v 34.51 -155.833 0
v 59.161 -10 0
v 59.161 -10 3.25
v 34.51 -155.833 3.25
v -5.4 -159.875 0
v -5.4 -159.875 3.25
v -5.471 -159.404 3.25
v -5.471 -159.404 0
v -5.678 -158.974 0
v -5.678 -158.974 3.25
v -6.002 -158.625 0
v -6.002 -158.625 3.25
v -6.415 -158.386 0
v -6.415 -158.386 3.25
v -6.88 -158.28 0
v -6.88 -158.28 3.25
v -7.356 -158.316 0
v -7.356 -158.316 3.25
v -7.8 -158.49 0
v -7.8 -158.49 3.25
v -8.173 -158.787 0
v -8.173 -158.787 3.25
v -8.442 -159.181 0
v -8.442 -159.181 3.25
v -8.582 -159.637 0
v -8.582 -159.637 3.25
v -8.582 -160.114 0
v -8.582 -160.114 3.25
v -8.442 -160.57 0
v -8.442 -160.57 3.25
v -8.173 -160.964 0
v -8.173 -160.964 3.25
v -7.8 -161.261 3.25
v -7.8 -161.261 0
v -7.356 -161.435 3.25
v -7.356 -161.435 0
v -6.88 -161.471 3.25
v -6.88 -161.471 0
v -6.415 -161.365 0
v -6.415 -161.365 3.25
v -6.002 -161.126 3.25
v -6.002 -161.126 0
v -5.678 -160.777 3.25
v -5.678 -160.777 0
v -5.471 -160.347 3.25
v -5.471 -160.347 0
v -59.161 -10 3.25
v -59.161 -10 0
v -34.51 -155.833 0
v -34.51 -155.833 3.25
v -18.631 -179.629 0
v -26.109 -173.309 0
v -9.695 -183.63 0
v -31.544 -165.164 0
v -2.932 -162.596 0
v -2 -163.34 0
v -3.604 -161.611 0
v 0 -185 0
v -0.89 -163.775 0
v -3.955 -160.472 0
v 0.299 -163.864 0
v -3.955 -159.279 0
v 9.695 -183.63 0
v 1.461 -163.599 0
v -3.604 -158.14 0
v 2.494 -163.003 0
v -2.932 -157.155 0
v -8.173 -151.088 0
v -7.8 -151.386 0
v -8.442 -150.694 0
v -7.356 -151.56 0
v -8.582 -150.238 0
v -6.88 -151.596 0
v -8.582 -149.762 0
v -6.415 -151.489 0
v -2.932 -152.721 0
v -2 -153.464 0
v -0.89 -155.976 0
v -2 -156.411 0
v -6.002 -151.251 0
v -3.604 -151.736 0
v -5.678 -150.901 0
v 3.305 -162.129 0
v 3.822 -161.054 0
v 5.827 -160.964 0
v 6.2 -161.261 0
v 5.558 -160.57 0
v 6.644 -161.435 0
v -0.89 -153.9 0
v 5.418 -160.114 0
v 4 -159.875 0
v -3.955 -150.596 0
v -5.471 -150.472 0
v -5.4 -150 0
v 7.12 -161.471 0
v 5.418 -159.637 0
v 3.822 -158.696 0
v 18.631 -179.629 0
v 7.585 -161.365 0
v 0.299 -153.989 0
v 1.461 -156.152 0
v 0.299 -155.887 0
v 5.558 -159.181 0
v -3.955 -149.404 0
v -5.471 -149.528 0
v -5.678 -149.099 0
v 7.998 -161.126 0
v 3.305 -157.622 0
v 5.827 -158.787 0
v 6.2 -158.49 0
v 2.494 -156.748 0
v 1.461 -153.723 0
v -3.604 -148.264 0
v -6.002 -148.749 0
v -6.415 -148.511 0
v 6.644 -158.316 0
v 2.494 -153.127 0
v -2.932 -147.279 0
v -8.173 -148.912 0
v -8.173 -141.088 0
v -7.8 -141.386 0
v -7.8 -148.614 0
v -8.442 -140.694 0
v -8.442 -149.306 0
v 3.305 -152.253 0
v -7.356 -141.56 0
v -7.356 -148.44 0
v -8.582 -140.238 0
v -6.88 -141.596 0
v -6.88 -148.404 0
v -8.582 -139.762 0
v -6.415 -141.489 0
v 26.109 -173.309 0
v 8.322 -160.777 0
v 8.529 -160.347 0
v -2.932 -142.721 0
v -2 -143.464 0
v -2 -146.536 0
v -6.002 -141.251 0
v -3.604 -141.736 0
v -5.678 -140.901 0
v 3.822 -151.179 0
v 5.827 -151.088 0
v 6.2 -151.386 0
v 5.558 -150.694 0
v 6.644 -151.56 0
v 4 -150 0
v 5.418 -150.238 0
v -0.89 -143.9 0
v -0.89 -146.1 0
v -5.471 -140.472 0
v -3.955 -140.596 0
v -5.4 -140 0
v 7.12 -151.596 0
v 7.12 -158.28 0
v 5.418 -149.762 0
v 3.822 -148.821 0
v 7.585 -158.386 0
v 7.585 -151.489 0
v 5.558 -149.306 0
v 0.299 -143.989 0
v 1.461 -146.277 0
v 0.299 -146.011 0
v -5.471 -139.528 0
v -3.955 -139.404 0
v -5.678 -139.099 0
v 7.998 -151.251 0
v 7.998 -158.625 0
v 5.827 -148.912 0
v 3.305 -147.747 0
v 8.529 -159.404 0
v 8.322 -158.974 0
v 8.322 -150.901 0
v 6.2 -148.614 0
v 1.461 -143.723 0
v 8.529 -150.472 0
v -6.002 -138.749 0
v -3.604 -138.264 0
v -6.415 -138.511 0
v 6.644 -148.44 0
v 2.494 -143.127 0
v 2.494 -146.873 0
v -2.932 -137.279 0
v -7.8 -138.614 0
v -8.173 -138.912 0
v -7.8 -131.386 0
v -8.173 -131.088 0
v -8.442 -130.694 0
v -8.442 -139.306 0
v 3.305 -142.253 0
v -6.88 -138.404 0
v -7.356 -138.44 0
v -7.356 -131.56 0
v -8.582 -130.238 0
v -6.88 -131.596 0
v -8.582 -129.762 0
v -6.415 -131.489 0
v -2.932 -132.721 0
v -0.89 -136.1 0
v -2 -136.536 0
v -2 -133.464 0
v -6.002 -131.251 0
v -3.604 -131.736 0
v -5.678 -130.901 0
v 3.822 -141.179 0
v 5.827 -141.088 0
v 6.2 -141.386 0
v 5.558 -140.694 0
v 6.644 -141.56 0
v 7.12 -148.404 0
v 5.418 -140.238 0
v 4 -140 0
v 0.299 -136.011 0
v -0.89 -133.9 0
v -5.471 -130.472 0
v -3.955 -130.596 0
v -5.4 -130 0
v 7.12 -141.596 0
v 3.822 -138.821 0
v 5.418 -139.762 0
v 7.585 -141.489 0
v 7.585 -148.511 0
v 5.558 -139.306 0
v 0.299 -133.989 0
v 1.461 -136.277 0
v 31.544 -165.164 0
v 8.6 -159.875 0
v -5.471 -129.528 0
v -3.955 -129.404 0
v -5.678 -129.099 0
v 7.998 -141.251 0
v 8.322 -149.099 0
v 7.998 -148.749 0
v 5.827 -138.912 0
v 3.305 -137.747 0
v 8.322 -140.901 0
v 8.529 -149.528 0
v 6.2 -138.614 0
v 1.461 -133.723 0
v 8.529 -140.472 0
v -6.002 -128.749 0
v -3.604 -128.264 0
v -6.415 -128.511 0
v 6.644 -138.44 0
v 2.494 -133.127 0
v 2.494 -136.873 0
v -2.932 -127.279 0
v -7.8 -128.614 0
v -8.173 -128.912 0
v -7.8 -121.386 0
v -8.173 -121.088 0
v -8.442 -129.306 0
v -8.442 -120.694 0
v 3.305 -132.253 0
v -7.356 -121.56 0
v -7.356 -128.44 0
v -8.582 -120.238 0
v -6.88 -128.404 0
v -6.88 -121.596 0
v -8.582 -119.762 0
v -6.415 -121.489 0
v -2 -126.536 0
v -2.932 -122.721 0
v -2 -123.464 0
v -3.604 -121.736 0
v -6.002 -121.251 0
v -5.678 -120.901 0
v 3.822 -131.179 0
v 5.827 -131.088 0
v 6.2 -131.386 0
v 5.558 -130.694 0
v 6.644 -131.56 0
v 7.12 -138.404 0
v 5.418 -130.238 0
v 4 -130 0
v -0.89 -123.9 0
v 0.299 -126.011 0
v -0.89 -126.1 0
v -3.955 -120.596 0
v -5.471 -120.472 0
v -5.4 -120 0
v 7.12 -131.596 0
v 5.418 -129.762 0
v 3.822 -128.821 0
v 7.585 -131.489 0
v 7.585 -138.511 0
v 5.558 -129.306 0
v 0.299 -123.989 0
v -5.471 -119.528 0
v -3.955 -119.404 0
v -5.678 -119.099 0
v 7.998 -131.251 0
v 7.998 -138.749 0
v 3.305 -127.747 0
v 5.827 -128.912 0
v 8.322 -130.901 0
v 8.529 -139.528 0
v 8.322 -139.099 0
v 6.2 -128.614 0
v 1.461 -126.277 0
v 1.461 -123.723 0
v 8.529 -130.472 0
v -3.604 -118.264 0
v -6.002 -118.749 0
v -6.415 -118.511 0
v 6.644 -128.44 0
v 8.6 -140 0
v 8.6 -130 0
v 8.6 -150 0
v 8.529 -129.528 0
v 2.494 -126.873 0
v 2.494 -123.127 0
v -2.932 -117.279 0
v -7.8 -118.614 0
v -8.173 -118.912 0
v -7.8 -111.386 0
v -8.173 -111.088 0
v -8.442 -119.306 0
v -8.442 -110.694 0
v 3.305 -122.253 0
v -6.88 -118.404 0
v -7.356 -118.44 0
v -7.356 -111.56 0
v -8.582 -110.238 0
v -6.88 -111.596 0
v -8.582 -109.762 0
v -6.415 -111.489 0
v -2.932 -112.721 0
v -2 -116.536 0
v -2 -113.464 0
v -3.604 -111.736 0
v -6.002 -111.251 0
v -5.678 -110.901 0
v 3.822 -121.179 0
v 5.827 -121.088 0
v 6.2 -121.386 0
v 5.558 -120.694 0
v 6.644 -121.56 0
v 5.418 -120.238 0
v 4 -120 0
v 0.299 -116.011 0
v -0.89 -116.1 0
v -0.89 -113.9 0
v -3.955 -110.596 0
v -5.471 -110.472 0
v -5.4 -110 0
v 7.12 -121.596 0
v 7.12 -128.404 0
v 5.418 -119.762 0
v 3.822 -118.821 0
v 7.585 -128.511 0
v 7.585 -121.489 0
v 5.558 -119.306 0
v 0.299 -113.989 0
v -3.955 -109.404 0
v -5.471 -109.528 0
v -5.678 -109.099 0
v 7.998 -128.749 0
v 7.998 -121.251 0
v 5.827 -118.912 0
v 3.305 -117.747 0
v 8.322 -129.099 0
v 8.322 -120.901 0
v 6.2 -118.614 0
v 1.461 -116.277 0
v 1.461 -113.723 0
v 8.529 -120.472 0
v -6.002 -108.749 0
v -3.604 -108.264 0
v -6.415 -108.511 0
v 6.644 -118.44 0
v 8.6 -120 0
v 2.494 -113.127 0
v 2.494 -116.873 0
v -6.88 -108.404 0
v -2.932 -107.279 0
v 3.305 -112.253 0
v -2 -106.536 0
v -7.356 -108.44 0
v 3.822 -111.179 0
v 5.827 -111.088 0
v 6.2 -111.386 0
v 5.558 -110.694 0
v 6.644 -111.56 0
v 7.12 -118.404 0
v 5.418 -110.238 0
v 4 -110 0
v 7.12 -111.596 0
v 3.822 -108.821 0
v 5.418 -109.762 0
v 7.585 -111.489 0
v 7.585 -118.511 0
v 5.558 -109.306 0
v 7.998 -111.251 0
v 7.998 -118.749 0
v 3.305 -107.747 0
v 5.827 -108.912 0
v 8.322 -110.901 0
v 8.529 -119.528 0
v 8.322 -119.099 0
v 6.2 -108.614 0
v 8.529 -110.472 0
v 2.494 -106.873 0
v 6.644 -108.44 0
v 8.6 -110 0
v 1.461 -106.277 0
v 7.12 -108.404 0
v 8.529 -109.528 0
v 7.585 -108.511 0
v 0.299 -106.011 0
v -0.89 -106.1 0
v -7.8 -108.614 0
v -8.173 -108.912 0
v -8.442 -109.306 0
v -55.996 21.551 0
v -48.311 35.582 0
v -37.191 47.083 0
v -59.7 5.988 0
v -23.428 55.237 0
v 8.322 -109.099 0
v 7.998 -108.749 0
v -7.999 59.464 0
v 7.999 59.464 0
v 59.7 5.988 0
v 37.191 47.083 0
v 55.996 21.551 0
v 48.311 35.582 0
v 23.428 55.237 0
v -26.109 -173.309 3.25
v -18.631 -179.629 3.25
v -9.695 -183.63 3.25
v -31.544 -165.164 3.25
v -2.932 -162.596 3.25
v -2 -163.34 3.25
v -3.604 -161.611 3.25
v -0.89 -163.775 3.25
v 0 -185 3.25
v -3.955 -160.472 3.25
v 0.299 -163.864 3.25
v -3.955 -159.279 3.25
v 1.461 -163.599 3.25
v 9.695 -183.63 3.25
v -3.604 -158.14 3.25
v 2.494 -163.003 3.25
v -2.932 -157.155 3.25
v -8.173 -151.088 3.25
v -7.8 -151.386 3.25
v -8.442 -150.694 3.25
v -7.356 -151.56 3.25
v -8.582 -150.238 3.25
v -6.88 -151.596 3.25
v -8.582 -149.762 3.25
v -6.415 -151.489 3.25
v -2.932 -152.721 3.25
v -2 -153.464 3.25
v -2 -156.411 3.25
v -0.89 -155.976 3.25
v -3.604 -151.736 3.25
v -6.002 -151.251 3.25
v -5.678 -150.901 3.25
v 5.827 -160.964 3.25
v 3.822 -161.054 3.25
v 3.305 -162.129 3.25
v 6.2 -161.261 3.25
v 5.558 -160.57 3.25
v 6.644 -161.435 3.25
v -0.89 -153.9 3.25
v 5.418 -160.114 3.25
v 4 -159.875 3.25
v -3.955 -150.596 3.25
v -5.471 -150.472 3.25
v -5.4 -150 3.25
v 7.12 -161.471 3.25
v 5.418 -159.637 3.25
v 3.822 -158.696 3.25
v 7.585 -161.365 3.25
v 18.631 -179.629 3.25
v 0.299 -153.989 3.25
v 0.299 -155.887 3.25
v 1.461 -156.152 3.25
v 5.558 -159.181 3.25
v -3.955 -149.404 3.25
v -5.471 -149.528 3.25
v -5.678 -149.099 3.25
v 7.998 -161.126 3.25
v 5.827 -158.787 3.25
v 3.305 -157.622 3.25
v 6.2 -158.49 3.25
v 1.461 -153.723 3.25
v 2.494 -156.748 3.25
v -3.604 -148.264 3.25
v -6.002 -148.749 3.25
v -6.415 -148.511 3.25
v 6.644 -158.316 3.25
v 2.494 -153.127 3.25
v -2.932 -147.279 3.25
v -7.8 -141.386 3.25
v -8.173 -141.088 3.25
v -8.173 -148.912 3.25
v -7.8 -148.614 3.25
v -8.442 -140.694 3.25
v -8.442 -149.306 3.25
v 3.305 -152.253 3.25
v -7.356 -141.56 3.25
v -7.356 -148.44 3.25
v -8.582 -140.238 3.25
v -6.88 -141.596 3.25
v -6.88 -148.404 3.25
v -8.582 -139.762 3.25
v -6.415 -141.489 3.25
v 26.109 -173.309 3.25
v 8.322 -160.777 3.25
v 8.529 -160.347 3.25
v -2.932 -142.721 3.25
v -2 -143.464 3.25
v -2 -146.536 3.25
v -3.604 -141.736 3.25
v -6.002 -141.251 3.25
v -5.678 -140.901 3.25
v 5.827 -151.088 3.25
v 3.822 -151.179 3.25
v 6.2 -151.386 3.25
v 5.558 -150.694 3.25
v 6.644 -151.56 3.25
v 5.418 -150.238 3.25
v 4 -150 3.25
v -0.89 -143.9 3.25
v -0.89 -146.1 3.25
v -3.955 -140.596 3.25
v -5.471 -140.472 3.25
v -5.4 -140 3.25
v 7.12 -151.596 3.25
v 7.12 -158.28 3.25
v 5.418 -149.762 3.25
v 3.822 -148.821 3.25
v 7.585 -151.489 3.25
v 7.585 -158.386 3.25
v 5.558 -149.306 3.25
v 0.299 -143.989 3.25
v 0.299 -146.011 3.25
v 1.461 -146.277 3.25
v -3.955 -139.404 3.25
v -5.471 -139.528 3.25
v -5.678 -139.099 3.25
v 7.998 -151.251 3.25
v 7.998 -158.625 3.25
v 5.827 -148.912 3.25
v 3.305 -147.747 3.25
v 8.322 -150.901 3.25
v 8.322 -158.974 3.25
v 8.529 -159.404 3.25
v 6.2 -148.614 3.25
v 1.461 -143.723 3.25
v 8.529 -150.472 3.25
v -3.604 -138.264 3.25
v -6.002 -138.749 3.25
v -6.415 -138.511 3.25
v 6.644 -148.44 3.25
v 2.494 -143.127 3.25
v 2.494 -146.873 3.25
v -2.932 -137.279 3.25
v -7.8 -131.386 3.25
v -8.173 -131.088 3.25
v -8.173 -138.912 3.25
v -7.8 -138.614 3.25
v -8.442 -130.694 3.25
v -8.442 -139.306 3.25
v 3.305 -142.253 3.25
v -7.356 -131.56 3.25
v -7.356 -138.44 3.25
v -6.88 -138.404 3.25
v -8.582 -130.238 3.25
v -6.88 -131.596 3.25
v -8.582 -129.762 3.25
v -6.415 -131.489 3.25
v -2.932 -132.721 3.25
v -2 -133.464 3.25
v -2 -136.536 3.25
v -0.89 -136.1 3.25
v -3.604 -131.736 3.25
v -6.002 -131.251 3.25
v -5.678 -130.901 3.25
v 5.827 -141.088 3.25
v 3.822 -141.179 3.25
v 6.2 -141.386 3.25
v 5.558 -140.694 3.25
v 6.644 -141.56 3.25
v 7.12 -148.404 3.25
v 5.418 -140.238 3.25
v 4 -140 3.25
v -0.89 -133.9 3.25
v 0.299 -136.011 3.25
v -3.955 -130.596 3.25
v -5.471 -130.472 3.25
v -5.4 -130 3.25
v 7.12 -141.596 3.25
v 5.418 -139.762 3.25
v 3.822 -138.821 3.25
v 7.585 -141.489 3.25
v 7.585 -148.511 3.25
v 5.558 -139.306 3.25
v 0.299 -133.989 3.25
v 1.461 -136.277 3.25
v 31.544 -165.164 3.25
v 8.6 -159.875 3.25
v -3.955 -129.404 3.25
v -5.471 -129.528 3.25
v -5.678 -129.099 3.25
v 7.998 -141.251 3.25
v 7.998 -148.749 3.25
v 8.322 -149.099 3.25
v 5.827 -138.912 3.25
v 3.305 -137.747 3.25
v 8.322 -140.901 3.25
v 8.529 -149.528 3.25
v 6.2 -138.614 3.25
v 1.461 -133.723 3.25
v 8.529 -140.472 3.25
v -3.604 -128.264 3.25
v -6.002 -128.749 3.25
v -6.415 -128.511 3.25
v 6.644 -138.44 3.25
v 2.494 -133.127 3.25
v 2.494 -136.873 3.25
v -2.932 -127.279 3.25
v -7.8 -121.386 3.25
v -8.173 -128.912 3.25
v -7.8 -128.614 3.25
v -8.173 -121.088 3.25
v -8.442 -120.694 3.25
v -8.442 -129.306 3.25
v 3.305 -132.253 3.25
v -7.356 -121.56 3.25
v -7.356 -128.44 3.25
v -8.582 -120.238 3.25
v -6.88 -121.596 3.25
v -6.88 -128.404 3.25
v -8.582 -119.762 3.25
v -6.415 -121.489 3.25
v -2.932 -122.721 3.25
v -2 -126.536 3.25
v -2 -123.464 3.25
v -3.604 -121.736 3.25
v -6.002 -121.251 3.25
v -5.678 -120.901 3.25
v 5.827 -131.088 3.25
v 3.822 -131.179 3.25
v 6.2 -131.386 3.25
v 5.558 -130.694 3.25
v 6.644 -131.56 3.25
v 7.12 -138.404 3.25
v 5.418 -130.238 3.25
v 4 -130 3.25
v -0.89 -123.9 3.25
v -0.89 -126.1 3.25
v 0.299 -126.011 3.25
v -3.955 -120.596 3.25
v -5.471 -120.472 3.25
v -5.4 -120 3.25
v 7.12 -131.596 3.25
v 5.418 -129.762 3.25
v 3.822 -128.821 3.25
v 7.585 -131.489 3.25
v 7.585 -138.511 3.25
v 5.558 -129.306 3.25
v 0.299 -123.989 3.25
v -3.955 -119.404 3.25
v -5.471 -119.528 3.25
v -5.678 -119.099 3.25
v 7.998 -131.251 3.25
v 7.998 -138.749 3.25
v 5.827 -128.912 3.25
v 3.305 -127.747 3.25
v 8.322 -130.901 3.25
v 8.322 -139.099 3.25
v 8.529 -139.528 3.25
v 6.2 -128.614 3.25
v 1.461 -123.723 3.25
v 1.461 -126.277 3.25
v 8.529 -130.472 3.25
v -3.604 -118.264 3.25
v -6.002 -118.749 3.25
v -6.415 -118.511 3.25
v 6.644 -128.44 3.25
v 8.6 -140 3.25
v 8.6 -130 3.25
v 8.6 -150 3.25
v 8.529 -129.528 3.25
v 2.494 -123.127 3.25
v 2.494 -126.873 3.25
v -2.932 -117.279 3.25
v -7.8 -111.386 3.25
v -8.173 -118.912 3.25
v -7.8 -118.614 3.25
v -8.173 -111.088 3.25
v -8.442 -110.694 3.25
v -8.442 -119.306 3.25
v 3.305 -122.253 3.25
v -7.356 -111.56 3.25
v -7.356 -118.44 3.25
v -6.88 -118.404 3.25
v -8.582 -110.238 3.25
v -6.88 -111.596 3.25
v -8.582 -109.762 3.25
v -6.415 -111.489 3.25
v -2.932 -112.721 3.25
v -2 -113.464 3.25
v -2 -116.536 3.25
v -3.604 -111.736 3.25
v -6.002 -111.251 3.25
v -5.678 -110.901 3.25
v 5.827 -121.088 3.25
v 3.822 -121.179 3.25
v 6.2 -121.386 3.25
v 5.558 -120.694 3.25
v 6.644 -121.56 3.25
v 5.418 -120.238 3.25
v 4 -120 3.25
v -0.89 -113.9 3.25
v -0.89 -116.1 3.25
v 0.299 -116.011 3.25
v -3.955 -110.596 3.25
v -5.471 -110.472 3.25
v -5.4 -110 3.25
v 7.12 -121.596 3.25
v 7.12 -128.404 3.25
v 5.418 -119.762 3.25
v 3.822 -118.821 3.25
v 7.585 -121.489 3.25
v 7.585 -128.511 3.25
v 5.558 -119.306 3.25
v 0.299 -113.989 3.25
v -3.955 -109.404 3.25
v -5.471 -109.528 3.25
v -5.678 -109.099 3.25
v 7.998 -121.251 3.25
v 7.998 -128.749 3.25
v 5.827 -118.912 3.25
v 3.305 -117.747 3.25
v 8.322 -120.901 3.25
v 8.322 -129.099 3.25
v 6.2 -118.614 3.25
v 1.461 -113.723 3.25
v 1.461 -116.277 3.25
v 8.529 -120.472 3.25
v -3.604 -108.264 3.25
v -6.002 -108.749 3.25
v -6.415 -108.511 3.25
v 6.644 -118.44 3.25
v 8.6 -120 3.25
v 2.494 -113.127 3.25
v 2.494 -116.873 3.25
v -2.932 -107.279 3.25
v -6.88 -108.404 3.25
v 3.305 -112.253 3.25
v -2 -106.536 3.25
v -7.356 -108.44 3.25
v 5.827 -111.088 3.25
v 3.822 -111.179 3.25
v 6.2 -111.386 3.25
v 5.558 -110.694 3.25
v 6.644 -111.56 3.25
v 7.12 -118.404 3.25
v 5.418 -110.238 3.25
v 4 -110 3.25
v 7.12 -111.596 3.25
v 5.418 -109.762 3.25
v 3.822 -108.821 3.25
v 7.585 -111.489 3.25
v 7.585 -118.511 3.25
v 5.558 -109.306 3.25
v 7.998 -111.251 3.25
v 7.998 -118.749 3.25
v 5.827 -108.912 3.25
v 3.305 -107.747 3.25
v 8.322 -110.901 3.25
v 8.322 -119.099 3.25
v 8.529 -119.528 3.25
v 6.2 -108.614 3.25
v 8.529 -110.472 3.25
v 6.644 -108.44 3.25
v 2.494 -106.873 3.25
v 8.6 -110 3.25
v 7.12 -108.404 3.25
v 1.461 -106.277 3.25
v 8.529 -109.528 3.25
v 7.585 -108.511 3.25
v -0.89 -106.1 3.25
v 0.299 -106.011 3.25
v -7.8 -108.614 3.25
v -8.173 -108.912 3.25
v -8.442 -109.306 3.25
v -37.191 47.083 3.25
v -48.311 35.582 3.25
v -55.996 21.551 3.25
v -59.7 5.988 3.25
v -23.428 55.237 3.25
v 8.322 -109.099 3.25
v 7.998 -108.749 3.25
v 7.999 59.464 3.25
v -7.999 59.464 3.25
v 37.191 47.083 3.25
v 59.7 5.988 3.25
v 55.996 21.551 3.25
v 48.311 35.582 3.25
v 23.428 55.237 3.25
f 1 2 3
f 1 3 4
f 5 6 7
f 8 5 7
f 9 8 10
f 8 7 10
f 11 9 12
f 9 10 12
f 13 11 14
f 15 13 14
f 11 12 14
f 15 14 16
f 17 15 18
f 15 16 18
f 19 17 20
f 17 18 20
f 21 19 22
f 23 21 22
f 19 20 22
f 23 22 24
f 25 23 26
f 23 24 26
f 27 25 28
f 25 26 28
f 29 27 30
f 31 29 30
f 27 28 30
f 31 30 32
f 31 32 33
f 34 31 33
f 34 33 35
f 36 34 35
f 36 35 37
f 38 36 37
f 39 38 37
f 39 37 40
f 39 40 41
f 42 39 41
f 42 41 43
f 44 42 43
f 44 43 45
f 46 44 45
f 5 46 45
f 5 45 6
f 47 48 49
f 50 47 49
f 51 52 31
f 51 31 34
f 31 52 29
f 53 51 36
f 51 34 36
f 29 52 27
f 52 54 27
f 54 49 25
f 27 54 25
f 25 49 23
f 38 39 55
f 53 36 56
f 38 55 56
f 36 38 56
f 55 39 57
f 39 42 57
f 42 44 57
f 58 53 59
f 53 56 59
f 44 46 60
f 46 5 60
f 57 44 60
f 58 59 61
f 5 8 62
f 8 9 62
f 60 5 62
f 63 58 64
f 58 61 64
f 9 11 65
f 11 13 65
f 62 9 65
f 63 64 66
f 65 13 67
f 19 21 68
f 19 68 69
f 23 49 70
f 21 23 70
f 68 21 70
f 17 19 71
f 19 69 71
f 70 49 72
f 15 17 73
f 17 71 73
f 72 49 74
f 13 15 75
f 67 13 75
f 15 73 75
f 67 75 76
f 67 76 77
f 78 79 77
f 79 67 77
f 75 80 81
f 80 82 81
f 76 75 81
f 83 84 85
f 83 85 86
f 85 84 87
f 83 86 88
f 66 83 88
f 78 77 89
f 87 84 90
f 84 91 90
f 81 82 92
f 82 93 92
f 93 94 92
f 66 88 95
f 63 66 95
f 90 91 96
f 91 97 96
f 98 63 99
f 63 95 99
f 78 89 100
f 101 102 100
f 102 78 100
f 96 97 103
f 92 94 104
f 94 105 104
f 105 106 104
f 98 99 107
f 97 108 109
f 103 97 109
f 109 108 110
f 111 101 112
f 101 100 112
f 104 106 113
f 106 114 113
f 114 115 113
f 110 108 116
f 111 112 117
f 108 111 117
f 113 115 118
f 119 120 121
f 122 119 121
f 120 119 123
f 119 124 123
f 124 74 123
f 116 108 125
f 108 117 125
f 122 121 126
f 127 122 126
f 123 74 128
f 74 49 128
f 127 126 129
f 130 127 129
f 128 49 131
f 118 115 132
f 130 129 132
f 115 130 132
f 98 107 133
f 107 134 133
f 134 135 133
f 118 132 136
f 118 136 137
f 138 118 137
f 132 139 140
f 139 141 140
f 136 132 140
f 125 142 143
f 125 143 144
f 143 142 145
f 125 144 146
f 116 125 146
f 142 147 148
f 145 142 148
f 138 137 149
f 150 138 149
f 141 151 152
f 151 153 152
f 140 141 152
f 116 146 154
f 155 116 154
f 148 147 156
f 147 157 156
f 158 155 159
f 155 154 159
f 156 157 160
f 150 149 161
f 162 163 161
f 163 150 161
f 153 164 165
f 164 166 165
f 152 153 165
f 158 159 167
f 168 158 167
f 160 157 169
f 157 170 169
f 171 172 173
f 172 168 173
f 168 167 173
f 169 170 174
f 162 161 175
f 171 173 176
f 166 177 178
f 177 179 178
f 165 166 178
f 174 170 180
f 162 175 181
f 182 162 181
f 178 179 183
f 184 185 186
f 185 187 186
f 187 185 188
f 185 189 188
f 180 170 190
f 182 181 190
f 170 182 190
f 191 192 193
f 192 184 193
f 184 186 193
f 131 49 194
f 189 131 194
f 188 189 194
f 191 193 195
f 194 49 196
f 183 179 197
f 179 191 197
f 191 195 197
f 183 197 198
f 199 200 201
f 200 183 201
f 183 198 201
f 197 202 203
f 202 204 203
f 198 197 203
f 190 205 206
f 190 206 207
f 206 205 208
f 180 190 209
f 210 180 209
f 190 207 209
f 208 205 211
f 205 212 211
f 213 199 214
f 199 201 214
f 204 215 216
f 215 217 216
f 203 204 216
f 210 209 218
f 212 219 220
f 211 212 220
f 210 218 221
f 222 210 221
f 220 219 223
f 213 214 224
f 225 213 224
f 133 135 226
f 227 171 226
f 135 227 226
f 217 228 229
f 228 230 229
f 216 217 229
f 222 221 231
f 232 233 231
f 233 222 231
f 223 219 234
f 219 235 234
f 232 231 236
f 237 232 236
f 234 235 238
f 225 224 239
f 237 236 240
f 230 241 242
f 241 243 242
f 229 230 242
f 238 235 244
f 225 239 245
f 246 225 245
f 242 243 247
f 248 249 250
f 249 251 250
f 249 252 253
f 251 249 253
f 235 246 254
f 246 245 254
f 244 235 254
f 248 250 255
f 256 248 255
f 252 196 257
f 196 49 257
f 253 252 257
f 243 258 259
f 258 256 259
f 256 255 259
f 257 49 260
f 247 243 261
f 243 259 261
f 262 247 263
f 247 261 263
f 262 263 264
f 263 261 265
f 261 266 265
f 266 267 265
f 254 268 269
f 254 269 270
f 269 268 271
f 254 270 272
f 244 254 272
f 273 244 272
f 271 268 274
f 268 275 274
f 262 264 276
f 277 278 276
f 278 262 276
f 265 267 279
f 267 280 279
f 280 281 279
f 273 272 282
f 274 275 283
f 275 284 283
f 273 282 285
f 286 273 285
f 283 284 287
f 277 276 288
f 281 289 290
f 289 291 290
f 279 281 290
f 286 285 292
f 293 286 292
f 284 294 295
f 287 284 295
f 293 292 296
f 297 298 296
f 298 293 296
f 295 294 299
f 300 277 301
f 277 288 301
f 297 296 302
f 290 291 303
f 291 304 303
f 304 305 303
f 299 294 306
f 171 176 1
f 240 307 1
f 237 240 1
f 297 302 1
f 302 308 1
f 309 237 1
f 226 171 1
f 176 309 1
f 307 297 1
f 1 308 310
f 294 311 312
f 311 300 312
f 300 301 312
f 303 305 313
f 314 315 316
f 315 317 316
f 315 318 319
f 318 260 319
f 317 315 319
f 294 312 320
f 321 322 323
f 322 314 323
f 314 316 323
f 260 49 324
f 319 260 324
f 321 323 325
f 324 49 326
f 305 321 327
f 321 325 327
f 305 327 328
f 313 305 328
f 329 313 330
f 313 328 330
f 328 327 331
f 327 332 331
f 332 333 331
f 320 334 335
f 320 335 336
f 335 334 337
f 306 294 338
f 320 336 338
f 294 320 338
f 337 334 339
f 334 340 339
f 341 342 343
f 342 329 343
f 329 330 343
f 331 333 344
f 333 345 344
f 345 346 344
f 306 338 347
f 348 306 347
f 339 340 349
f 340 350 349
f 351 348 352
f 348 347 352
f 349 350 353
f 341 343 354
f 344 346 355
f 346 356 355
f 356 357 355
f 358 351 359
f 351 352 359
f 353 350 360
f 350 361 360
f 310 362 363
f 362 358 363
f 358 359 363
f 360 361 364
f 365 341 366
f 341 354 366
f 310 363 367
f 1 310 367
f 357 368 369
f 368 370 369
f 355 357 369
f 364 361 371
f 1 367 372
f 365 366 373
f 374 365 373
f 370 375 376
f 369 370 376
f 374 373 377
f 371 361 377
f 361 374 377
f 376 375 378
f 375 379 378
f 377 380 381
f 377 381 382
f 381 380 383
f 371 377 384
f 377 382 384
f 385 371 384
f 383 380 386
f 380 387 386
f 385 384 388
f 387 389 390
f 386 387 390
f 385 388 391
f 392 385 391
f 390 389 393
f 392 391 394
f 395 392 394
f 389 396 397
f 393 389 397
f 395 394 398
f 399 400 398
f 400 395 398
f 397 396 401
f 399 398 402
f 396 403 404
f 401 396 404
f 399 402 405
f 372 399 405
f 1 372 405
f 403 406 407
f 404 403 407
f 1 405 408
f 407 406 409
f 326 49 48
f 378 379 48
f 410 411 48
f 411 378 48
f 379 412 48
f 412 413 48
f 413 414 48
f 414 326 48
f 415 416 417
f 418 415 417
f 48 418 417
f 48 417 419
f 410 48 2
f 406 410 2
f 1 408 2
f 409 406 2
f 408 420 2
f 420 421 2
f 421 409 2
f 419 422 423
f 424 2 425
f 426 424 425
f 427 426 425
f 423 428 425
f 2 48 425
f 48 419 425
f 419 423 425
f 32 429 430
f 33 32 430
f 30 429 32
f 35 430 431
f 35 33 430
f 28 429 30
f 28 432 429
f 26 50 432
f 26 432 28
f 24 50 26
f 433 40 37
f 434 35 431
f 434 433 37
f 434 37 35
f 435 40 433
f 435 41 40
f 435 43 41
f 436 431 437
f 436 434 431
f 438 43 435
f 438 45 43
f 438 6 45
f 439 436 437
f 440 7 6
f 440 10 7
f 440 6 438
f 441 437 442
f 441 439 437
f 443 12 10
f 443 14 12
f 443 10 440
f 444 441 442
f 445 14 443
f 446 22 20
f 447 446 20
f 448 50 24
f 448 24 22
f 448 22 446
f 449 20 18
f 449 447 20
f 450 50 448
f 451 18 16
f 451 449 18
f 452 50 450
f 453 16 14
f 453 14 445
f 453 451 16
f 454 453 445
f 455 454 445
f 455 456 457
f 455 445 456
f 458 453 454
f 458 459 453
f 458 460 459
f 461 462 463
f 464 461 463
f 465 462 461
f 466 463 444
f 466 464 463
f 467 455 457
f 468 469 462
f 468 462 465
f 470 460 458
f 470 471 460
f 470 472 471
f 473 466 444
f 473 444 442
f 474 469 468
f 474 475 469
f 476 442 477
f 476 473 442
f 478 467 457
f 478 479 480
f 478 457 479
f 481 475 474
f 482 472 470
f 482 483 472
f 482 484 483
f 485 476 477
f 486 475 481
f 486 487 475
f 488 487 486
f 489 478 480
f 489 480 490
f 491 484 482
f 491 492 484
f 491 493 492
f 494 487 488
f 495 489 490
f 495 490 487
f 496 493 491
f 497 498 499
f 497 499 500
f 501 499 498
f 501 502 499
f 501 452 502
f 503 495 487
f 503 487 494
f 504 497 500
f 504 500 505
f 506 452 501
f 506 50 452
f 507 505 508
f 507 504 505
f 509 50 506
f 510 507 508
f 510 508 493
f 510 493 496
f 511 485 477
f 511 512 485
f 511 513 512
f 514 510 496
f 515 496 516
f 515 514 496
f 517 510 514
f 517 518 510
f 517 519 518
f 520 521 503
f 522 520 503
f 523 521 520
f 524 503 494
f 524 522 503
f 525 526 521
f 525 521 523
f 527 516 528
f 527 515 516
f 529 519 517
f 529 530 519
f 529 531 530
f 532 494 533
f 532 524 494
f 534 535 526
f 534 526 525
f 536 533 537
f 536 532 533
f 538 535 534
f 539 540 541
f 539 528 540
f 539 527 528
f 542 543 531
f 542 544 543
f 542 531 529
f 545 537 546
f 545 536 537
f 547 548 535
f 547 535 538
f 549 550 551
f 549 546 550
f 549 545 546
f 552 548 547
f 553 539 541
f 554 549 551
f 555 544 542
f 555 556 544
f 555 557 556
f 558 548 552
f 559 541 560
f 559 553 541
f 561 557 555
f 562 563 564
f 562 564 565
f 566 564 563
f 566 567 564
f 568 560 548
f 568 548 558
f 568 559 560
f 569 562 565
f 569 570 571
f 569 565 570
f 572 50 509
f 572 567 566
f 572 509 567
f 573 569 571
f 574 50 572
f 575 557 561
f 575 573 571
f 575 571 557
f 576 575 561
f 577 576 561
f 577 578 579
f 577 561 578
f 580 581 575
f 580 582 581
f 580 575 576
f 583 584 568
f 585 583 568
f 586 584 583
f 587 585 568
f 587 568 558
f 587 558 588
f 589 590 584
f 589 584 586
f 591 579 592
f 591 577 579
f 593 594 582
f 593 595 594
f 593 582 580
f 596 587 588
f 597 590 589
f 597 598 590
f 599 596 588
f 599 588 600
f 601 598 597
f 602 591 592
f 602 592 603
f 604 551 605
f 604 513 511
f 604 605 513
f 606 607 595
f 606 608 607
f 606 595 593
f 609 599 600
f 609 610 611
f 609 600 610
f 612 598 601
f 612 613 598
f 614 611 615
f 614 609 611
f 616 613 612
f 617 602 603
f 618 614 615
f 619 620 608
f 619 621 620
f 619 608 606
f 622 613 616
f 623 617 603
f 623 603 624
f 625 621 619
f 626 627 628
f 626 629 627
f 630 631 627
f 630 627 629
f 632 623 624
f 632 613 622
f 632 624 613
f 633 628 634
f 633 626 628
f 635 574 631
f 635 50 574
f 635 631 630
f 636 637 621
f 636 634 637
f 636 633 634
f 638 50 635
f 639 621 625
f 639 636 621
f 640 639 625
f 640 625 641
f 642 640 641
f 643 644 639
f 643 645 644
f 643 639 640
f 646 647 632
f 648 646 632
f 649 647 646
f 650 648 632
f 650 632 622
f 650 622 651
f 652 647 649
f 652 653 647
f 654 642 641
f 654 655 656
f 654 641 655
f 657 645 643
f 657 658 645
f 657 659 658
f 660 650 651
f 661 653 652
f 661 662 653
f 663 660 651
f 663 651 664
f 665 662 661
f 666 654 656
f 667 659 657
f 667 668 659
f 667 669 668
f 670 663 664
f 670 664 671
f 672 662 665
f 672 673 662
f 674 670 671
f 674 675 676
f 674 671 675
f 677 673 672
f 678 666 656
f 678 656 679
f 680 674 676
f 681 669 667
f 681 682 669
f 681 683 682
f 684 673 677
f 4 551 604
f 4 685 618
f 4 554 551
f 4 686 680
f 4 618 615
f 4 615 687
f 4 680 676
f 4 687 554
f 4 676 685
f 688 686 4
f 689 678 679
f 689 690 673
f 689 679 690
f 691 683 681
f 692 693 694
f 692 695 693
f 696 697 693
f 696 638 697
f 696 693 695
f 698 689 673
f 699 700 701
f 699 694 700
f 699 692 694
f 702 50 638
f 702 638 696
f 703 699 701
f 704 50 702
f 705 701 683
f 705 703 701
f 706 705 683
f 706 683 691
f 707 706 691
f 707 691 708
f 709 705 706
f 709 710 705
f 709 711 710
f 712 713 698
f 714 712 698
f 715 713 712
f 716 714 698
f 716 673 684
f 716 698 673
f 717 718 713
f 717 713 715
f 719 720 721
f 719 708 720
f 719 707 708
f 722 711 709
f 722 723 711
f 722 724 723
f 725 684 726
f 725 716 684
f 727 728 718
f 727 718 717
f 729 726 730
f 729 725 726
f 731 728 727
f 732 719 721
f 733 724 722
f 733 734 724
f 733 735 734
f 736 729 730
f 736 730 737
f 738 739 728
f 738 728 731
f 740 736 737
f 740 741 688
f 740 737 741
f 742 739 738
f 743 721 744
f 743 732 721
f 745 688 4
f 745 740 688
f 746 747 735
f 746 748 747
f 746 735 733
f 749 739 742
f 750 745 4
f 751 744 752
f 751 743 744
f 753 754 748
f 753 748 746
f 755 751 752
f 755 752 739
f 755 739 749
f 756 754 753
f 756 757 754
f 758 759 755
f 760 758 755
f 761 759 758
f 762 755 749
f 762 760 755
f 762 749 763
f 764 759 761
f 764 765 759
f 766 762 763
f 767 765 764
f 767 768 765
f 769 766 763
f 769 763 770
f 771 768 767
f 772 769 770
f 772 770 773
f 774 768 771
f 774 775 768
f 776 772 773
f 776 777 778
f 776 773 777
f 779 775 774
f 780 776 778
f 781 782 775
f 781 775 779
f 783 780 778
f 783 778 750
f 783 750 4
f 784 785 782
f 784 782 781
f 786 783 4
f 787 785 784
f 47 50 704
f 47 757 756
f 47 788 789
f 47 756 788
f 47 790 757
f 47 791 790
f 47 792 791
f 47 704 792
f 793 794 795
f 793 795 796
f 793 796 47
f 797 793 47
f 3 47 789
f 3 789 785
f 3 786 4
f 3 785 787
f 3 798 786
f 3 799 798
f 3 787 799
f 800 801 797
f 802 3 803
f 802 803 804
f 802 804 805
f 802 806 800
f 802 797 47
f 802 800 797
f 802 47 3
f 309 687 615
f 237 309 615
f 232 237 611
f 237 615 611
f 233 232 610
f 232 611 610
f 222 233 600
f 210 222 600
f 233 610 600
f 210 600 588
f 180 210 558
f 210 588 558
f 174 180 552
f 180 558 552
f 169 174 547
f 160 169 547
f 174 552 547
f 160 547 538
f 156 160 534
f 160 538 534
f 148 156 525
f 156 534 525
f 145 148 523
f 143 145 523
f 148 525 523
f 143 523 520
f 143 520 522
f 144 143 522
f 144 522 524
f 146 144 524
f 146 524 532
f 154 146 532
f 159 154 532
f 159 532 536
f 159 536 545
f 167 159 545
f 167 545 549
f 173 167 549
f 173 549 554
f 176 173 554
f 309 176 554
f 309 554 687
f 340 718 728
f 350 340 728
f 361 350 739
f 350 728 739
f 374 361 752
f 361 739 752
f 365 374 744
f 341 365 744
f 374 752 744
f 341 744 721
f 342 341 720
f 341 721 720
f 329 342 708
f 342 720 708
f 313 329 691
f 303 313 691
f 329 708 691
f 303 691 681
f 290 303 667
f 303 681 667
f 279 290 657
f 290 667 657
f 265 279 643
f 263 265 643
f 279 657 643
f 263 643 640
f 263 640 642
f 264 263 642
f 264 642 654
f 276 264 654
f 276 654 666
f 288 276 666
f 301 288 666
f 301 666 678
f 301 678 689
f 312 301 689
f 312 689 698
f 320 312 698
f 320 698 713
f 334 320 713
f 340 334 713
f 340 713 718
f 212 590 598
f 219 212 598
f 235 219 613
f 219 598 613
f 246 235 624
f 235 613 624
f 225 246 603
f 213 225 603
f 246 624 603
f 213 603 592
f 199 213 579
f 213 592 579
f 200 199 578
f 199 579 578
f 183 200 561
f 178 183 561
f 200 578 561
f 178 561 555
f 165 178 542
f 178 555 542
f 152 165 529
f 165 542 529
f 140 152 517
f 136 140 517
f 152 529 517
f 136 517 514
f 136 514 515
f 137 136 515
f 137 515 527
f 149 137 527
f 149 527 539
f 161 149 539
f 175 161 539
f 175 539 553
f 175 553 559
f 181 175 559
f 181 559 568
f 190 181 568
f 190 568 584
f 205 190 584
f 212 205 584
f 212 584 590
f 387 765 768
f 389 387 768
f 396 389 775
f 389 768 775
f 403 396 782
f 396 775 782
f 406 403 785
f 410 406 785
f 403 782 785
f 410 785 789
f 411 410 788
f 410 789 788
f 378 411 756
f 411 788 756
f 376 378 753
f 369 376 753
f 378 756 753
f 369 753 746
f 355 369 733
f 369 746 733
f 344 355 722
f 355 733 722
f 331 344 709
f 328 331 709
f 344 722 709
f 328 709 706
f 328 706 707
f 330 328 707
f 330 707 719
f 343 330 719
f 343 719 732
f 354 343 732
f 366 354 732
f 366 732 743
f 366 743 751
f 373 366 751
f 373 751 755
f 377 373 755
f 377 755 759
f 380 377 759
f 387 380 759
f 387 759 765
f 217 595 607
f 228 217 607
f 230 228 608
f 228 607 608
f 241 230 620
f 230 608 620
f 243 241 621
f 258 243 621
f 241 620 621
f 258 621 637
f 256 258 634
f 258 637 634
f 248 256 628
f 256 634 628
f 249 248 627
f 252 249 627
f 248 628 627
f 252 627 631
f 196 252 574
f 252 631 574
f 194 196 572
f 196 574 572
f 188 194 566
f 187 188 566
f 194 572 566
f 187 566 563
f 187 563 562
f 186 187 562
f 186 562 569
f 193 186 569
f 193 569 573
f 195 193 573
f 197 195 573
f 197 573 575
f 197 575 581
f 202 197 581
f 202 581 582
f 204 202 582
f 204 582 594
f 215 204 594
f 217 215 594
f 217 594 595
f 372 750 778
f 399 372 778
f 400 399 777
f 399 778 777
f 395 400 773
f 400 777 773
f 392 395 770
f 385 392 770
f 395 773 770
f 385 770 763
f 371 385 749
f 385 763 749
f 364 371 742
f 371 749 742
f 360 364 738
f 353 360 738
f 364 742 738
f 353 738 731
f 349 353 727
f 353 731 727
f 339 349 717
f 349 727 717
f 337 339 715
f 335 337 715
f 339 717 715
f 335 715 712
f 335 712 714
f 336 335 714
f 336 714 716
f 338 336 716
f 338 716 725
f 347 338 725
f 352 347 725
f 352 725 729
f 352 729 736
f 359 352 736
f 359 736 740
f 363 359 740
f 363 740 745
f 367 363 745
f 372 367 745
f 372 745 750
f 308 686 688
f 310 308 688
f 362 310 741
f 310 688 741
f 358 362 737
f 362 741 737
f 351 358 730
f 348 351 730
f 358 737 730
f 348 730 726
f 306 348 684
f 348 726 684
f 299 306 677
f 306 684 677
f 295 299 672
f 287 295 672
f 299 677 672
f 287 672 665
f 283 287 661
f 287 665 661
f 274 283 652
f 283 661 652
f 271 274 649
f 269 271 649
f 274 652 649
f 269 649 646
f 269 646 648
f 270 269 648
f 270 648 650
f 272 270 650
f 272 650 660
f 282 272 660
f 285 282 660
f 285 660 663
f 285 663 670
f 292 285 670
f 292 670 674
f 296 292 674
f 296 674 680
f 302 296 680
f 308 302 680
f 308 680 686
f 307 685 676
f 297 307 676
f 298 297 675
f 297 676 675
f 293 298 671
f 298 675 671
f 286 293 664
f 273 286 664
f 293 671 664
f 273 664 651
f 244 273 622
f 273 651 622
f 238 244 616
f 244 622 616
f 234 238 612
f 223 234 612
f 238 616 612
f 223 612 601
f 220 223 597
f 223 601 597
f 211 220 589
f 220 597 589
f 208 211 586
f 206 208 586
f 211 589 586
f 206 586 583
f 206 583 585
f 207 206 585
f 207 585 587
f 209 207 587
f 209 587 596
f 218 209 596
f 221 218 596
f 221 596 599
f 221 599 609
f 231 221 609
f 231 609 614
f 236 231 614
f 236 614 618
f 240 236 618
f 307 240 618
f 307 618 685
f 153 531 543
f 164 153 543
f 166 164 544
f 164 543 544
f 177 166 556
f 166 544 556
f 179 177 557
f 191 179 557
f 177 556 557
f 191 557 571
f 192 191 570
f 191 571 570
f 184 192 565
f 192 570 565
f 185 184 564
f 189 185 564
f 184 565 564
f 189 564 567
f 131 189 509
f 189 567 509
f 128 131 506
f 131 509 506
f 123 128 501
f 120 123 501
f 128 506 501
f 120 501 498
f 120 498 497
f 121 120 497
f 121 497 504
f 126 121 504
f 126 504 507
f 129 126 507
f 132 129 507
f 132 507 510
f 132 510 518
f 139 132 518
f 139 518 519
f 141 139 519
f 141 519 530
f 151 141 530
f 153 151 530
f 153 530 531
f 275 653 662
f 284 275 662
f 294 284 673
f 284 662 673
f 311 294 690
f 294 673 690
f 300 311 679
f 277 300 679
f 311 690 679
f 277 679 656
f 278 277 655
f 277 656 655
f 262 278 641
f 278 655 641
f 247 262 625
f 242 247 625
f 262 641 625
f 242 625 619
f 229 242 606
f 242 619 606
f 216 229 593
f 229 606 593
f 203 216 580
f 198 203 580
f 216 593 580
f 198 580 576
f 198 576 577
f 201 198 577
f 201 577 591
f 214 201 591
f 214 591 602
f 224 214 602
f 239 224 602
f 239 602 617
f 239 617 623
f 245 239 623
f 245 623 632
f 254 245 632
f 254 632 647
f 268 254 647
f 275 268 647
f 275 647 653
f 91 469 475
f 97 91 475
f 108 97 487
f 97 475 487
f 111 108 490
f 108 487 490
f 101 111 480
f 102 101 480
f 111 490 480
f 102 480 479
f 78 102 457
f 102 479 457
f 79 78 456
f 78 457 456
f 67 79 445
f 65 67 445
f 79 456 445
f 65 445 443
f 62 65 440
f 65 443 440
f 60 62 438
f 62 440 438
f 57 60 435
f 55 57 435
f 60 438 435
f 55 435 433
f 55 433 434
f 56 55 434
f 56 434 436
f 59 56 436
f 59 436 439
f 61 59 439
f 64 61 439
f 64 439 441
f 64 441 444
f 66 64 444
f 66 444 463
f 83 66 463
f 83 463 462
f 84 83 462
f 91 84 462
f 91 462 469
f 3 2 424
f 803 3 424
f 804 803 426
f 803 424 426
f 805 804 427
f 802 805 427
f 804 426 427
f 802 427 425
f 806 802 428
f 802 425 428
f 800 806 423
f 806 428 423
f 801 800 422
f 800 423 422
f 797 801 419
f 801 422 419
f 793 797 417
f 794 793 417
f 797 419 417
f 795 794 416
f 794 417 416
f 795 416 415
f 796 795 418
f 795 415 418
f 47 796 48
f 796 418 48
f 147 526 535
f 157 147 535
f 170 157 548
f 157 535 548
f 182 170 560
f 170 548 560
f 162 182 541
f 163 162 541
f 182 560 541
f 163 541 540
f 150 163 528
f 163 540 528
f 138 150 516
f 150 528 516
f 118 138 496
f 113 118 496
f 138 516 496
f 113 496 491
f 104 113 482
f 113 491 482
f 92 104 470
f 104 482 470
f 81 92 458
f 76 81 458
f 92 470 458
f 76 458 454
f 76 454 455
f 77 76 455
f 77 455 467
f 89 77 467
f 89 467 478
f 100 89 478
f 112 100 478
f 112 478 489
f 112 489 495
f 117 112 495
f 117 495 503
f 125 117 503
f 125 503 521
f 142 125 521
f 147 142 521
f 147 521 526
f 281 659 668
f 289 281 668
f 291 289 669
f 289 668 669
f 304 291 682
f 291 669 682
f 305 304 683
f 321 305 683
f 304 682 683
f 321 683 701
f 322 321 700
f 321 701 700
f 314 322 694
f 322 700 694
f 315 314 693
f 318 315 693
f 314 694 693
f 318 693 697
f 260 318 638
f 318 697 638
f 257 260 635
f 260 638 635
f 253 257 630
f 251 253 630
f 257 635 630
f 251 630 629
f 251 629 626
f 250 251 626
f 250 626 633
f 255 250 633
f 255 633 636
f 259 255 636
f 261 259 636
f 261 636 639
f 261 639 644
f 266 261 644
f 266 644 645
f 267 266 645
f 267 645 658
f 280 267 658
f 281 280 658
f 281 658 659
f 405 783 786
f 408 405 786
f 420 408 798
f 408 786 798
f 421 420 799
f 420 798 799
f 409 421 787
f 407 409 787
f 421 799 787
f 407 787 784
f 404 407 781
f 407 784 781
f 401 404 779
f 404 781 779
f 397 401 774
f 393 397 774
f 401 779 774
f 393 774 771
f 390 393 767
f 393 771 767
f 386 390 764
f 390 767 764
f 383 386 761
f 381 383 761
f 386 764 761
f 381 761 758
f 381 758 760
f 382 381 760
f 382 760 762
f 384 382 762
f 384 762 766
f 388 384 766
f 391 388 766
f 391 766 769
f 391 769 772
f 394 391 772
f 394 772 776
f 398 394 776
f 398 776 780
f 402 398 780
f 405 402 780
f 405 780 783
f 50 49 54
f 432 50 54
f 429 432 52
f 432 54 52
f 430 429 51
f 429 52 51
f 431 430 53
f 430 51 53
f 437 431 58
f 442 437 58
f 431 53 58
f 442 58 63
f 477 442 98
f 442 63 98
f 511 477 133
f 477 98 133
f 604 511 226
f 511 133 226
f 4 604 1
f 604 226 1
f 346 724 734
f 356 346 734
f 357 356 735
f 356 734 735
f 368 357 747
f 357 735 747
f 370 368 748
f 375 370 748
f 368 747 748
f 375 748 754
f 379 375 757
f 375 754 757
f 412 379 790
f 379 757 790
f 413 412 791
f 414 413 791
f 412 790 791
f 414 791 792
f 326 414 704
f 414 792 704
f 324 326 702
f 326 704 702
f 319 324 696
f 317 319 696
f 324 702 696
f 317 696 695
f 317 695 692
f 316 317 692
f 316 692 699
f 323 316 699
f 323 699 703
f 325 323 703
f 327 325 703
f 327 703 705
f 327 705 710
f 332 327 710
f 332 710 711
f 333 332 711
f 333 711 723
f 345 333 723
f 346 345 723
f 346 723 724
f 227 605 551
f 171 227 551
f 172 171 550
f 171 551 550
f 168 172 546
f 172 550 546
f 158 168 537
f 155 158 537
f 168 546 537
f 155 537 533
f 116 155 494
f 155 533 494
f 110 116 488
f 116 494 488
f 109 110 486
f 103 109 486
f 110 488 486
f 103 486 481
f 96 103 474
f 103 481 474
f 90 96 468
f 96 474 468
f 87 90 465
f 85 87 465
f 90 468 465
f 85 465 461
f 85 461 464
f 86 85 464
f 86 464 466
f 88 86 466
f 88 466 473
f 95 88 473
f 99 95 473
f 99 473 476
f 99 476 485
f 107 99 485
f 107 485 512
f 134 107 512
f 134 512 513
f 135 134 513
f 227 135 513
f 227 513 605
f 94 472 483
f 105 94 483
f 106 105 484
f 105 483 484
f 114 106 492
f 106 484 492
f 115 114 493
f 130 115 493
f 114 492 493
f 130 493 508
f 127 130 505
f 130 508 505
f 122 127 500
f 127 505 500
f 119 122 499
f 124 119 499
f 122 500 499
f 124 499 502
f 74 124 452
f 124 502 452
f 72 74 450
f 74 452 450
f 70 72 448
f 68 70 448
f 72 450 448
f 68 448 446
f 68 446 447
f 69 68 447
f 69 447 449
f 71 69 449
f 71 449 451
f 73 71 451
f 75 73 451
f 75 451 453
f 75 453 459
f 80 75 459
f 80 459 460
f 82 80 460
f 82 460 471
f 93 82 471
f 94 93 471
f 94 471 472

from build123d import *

# Parameters (mm, degrees)
PAD_DEPTH     = 3.25
SKETCH001_R   = 4
SKETCH001_R_2 = 1.6
POCKET_DEPTH  = 3.5


with BuildPart() as part:
    # Sketch → Pad (new body)
    with BuildSketch(Plane.XY):
        with BuildLine():
            ThreePointArc((59.160798, -10), (0, 60), (-59.160798, -10))
            Line((-59.160798, -10), (-34.510465, -155.833333))
            ThreePointArc((-34.510465, -155.833333), (0, -185), (34.510465, -155.833333))
            Line((59.160798, -10), (34.510465, -155.833333))
        make_face()
    extrude(amount=PAD_DEPTH)

    # Sketch001 (on Face6 of Pad) → Pocket (cut)
    with BuildSketch(Plane.XY.offset(3.25)):
        with Locations((0, -150)):
            Circle(SKETCH001_R)
        with Locations((-7, -150)):
            Circle(SKETCH001_R_2)
        with Locations((7, -150)):
            Circle(SKETCH001_R_2)
        with Locations((0, -130)):
            Circle(SKETCH001_R)
        with Locations((7, -130)):
            Circle(SKETCH001_R_2)
        with Locations((-7, -130)):
            Circle(SKETCH001_R_2)
        with Locations((0, -140)):
            Circle(SKETCH001_R)
        with Locations((7, -140)):
            Circle(SKETCH001_R_2)
        with Locations((-7, -140)):
            Circle(SKETCH001_R_2)
        with Locations((0, -159.875452)):
            Circle(SKETCH001_R)
        with Locations((7, -159.875452)):
            Circle(SKETCH001_R_2)
        with Locations((-7, -159.875452)):
            Circle(SKETCH001_R_2)
        with Locations((0, -120)):
            Circle(SKETCH001_R)
        with Locations((7, -120)):
            Circle(SKETCH001_R_2)
        with Locations((-7, -120)):
            Circle(SKETCH001_R_2)
        with Locations((0, -110)):
            Circle(SKETCH001_R)
        with Locations((7, -110)):
            Circle(SKETCH001_R_2)
        with Locations((-7, -110)):
            Circle(SKETCH001_R_2)
    extrude(amount=-POCKET_DEPTH, mode=Mode.SUBTRACT)


solid = part.part
